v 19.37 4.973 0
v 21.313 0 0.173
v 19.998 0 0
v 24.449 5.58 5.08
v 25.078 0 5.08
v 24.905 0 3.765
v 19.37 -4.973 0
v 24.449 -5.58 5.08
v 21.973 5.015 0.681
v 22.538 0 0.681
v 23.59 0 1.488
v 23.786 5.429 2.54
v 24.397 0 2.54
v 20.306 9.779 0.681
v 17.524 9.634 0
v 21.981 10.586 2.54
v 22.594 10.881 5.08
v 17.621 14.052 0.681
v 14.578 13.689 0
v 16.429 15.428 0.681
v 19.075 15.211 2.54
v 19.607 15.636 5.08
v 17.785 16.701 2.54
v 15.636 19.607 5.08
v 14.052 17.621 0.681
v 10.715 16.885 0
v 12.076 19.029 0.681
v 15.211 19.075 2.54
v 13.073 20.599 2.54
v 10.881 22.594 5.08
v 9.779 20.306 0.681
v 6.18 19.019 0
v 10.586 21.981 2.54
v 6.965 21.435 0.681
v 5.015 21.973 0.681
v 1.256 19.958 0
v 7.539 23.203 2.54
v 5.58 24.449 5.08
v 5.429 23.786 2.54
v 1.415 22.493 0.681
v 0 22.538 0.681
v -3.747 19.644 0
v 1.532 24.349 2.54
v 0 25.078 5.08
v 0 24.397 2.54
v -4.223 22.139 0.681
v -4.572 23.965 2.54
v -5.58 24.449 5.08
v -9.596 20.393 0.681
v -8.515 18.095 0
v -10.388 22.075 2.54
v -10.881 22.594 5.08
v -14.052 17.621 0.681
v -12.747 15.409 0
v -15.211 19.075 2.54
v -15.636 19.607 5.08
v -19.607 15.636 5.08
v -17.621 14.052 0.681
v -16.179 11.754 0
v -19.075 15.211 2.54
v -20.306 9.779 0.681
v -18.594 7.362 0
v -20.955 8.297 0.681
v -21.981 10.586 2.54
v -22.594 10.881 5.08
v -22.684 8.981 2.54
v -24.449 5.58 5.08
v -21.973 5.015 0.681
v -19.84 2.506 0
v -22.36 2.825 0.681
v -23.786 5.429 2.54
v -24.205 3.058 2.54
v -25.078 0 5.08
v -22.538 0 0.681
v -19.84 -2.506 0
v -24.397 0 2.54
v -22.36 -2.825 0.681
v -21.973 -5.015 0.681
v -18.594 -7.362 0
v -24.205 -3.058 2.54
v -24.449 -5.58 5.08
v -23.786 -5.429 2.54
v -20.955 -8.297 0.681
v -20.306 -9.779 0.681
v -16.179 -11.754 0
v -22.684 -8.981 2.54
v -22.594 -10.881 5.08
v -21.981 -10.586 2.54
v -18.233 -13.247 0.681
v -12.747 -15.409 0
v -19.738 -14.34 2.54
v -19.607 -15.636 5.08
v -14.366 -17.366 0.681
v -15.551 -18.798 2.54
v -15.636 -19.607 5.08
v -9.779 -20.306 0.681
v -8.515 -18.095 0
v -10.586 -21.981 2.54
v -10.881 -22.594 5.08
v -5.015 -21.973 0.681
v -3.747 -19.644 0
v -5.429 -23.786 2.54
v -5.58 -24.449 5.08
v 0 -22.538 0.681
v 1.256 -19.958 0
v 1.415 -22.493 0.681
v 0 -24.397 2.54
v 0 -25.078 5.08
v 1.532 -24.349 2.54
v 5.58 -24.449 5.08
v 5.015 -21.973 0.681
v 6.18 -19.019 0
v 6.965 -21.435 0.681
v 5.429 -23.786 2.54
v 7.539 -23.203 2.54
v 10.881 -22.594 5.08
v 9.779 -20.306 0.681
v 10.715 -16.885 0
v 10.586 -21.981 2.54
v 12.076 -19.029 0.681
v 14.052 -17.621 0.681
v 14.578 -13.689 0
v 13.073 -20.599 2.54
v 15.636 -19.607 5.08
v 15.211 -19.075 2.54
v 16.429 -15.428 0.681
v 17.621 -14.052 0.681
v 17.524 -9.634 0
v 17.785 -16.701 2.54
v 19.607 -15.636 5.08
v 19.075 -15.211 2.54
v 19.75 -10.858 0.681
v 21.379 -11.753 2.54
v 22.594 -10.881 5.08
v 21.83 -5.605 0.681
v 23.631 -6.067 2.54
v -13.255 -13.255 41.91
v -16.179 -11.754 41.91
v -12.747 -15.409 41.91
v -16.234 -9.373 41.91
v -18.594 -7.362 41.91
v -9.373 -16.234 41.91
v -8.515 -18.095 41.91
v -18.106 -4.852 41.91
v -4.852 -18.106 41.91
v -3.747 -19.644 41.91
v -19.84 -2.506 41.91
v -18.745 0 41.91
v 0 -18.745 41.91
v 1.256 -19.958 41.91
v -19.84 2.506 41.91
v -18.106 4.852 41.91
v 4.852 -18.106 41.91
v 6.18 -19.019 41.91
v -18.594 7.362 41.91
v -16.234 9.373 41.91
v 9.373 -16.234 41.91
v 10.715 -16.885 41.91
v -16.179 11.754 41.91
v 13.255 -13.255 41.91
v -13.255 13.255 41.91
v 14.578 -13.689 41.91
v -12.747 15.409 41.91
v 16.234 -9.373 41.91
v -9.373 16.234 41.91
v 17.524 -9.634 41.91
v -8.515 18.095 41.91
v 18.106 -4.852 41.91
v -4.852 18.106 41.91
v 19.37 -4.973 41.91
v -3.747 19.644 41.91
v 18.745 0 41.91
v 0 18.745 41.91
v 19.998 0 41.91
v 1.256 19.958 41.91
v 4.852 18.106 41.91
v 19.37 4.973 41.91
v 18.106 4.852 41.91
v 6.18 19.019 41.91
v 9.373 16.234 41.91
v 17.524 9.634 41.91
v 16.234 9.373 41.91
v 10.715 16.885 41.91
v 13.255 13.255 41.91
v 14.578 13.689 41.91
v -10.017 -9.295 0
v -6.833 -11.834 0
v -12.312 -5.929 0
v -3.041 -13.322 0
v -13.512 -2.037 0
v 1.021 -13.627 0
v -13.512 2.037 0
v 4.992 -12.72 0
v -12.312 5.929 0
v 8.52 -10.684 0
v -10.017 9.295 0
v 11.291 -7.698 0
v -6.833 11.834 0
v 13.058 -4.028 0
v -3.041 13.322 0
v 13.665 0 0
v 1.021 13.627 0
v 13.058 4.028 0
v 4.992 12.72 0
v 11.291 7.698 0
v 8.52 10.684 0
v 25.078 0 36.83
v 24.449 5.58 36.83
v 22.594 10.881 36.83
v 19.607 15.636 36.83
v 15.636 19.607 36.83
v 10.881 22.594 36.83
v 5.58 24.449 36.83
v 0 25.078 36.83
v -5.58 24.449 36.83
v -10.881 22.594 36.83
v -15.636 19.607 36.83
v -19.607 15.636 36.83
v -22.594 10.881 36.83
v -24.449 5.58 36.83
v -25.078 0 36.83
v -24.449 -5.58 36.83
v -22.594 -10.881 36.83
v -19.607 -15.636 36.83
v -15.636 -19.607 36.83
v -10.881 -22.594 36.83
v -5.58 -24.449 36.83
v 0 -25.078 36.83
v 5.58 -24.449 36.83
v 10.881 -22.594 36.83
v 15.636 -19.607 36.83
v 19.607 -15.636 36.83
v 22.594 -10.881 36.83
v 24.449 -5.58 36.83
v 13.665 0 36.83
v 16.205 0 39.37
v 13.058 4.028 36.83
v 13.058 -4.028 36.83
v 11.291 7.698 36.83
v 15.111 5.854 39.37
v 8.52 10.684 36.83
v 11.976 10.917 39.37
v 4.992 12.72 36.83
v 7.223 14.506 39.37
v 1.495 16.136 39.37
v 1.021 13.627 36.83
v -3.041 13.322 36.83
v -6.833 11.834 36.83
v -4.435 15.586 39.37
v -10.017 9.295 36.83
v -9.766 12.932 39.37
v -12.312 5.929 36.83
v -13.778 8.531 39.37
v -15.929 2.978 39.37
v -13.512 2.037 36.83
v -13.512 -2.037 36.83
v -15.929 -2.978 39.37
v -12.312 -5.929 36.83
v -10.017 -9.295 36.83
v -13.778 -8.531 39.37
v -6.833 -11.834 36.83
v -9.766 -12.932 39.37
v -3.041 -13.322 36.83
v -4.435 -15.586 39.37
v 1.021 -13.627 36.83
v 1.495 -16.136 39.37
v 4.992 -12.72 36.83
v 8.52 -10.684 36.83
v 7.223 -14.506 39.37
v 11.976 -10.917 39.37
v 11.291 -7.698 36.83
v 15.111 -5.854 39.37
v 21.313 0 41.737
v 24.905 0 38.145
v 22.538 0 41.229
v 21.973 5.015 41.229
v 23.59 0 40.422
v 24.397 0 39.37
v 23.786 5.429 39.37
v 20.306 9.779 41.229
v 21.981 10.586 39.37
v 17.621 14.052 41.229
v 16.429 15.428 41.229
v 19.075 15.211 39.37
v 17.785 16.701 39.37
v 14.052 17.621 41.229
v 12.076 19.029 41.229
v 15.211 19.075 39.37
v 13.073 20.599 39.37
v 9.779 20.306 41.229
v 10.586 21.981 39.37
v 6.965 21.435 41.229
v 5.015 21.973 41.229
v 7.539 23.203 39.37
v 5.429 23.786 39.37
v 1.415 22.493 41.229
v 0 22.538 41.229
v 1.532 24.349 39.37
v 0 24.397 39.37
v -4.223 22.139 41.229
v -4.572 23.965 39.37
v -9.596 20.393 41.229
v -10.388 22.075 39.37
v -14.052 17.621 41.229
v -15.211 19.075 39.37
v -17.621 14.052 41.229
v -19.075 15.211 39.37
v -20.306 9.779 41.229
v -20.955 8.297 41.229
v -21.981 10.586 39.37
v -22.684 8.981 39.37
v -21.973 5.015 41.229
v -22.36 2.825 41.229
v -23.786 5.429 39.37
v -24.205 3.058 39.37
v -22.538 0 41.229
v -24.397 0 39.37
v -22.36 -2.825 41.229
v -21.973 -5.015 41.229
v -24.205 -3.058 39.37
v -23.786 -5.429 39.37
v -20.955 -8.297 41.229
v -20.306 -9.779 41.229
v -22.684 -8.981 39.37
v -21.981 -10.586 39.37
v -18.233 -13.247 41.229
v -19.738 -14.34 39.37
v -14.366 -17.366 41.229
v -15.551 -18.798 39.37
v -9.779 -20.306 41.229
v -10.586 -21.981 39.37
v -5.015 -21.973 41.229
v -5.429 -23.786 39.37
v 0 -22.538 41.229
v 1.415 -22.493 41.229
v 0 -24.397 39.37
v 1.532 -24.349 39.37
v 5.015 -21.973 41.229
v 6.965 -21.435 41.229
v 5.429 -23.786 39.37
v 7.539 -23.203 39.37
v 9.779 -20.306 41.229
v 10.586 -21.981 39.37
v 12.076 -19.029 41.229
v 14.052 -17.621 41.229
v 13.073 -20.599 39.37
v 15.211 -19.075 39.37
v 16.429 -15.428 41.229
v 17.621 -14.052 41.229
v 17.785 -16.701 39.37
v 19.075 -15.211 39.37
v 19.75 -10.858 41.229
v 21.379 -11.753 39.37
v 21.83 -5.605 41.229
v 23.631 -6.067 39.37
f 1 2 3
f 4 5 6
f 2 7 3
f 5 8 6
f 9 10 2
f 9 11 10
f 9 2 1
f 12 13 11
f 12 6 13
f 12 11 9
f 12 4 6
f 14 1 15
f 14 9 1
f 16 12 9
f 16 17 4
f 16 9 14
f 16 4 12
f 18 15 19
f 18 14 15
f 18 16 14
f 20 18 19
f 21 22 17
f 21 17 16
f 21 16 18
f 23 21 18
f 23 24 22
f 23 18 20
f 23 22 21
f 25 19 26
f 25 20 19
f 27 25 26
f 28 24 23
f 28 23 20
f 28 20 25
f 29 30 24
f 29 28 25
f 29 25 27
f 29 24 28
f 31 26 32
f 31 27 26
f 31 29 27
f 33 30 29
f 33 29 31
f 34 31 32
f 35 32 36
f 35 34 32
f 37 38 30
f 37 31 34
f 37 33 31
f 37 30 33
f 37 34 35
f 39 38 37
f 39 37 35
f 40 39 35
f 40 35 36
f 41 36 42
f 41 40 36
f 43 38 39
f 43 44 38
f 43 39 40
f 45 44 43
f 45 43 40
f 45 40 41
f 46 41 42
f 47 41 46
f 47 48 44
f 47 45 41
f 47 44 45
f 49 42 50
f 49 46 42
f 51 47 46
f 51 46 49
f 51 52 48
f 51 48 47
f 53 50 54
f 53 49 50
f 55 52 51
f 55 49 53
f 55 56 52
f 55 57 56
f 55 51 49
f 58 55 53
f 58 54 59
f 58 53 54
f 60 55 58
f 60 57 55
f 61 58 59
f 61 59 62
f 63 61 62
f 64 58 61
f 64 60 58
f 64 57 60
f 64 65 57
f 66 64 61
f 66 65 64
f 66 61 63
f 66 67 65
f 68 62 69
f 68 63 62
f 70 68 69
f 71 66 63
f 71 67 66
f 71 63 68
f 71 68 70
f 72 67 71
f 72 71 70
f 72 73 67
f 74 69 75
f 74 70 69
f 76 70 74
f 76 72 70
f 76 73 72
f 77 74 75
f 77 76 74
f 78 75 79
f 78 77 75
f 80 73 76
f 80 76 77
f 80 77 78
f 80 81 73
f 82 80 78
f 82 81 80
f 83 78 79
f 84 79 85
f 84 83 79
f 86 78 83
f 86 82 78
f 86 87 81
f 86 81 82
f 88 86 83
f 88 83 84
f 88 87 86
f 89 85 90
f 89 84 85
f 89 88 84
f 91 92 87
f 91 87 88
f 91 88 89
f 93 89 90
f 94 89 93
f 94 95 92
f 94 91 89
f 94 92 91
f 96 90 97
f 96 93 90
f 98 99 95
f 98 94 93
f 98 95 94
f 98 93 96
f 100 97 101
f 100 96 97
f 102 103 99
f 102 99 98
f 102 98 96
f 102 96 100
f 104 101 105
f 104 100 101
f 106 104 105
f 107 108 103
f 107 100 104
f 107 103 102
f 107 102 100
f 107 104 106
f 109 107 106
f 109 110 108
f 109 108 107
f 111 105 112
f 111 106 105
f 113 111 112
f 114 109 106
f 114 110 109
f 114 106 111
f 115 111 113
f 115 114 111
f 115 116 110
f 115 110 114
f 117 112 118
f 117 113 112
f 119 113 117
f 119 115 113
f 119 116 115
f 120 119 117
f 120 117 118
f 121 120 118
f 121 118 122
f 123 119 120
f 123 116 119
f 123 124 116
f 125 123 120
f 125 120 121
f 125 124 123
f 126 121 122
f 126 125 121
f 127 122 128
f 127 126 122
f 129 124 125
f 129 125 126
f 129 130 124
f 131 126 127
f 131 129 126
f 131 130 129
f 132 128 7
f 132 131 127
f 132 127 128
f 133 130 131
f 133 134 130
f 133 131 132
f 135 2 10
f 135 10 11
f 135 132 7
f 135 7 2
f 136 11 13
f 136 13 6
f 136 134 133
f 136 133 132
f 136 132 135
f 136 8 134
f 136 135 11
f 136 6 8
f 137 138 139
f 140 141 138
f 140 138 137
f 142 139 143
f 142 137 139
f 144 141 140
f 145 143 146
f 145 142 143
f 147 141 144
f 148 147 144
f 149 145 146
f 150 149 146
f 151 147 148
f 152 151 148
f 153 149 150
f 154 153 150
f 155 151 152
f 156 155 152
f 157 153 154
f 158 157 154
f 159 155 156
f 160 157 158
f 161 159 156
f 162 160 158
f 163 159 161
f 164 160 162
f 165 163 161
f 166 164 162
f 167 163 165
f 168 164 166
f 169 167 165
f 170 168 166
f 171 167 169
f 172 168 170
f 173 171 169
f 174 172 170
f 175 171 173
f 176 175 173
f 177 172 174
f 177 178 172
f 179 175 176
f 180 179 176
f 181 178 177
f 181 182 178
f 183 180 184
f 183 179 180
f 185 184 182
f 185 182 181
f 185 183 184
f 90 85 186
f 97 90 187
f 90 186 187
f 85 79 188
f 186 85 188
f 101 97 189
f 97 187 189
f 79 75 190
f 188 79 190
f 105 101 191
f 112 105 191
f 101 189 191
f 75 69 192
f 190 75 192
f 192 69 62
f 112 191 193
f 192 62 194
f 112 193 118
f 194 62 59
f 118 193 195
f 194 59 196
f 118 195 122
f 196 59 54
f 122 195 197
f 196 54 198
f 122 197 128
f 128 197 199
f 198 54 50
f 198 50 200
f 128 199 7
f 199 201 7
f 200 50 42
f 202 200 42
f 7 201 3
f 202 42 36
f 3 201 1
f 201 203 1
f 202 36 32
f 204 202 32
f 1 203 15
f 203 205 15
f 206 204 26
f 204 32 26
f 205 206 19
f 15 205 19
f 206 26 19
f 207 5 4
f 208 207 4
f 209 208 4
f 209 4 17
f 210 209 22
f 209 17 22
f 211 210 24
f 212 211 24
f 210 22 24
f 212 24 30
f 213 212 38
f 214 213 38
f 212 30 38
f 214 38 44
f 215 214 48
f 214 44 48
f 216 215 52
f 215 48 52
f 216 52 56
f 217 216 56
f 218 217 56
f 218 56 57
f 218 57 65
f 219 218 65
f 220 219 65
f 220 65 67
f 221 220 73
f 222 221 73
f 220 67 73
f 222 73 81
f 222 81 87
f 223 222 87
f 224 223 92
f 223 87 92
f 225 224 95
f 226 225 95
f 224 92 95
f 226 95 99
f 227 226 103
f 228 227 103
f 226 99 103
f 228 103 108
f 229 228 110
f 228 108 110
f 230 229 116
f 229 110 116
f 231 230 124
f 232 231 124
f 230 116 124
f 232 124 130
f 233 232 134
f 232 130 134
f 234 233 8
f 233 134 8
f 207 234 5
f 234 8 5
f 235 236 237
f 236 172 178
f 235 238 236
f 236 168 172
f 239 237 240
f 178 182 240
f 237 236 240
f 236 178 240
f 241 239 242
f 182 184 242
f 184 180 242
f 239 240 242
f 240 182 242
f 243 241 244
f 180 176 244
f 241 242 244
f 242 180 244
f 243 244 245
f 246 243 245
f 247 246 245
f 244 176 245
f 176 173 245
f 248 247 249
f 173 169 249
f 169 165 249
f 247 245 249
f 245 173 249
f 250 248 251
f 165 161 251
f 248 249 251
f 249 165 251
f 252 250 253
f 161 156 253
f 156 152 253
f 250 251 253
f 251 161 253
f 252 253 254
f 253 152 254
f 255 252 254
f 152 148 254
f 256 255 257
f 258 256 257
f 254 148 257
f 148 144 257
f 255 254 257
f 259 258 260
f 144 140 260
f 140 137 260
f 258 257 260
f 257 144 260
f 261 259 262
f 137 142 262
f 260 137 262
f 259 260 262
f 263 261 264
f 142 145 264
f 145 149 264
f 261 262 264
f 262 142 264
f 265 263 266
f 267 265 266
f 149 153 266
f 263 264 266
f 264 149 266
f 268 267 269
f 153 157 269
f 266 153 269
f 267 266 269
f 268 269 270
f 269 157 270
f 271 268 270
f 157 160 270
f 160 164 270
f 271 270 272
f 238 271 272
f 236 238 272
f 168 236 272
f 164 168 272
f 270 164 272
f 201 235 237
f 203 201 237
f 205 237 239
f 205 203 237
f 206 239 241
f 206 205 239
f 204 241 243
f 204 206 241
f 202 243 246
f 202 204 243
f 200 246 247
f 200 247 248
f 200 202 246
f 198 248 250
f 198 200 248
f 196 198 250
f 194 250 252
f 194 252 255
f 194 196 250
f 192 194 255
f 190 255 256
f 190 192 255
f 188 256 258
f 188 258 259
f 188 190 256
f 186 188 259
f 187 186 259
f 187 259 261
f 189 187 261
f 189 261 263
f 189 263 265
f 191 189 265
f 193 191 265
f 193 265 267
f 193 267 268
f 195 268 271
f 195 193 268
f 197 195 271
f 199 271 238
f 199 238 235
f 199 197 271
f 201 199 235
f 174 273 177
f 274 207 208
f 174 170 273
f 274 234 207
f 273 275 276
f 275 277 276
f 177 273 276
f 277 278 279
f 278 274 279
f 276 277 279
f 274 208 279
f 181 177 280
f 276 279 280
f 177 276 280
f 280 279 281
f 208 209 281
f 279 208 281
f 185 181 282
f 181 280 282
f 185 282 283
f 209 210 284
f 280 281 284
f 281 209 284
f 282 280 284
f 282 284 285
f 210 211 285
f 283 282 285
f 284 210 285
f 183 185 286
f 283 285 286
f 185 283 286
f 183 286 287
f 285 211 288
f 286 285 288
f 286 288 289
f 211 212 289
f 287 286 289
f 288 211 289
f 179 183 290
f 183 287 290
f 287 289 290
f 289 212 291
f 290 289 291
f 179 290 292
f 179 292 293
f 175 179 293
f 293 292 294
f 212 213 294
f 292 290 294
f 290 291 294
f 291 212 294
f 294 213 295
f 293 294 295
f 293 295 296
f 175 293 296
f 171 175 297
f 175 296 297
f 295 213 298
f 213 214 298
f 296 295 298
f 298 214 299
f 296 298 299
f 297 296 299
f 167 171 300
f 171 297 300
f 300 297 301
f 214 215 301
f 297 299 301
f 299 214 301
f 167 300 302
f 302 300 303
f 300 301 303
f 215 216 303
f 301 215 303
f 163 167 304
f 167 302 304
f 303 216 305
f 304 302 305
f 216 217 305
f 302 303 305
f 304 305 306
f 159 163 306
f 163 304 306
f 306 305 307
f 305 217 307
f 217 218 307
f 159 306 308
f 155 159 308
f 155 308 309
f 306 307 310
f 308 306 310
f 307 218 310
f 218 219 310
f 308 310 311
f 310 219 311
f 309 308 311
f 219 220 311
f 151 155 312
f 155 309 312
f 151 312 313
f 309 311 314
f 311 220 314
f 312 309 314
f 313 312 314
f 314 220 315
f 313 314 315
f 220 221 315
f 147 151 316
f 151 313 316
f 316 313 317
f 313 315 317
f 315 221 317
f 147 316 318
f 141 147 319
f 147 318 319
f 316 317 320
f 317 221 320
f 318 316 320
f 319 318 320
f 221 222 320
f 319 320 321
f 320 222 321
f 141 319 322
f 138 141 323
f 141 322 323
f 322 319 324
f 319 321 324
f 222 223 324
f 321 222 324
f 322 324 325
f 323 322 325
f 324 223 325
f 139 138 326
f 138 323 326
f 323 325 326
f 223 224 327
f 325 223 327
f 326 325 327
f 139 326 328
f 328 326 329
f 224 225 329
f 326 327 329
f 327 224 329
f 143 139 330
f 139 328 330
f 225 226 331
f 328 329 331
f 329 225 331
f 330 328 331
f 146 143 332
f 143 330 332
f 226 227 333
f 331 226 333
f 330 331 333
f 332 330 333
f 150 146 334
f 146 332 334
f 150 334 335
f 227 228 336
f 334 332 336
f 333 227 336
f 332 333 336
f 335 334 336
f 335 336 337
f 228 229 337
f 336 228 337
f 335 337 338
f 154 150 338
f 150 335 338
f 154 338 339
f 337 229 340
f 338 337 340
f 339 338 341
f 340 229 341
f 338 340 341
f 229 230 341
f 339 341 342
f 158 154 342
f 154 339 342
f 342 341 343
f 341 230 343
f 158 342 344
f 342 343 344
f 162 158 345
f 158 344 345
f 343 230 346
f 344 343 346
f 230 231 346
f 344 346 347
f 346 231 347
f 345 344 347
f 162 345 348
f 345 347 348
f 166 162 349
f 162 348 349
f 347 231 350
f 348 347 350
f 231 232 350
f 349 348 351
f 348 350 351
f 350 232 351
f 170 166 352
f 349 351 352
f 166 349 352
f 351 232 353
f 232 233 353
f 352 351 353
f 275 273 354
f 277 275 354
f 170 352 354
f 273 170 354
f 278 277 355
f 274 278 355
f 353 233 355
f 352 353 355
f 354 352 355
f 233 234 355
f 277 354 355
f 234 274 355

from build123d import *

# Parameters (mm, degrees)
F0_R     = 25.077837
F0_R_2   = 13.665019
F1_DEPTH = 41.91
F2_SIZE  = 5.08
F3_R     = 5.08


with BuildPart() as f1:
    # F0 (on Top) → F1 (new body)
    with BuildSketch(Plane.XY):
        Circle(F0_R)
        Circle(F0_R_2, mode=Mode.SUBTRACT)
    extrude(amount=F1_DEPTH)

    # F2
    f2_edges = [f1.edges().sort_by_distance(p)[0] for p in [
        (-13.665019, 0, 41.91),
    ]]
    chamfer(f2_edges, length=F2_SIZE)

    # F3
    f3_edges = [f1.edges().sort_by_distance(p)[0] for p in [
        (-25.077837, 0, 41.91),
        (-25.077837, 0, 0),
    ]]
    fillet(f3_edges, radius=F3_R)


solid = f1.part
